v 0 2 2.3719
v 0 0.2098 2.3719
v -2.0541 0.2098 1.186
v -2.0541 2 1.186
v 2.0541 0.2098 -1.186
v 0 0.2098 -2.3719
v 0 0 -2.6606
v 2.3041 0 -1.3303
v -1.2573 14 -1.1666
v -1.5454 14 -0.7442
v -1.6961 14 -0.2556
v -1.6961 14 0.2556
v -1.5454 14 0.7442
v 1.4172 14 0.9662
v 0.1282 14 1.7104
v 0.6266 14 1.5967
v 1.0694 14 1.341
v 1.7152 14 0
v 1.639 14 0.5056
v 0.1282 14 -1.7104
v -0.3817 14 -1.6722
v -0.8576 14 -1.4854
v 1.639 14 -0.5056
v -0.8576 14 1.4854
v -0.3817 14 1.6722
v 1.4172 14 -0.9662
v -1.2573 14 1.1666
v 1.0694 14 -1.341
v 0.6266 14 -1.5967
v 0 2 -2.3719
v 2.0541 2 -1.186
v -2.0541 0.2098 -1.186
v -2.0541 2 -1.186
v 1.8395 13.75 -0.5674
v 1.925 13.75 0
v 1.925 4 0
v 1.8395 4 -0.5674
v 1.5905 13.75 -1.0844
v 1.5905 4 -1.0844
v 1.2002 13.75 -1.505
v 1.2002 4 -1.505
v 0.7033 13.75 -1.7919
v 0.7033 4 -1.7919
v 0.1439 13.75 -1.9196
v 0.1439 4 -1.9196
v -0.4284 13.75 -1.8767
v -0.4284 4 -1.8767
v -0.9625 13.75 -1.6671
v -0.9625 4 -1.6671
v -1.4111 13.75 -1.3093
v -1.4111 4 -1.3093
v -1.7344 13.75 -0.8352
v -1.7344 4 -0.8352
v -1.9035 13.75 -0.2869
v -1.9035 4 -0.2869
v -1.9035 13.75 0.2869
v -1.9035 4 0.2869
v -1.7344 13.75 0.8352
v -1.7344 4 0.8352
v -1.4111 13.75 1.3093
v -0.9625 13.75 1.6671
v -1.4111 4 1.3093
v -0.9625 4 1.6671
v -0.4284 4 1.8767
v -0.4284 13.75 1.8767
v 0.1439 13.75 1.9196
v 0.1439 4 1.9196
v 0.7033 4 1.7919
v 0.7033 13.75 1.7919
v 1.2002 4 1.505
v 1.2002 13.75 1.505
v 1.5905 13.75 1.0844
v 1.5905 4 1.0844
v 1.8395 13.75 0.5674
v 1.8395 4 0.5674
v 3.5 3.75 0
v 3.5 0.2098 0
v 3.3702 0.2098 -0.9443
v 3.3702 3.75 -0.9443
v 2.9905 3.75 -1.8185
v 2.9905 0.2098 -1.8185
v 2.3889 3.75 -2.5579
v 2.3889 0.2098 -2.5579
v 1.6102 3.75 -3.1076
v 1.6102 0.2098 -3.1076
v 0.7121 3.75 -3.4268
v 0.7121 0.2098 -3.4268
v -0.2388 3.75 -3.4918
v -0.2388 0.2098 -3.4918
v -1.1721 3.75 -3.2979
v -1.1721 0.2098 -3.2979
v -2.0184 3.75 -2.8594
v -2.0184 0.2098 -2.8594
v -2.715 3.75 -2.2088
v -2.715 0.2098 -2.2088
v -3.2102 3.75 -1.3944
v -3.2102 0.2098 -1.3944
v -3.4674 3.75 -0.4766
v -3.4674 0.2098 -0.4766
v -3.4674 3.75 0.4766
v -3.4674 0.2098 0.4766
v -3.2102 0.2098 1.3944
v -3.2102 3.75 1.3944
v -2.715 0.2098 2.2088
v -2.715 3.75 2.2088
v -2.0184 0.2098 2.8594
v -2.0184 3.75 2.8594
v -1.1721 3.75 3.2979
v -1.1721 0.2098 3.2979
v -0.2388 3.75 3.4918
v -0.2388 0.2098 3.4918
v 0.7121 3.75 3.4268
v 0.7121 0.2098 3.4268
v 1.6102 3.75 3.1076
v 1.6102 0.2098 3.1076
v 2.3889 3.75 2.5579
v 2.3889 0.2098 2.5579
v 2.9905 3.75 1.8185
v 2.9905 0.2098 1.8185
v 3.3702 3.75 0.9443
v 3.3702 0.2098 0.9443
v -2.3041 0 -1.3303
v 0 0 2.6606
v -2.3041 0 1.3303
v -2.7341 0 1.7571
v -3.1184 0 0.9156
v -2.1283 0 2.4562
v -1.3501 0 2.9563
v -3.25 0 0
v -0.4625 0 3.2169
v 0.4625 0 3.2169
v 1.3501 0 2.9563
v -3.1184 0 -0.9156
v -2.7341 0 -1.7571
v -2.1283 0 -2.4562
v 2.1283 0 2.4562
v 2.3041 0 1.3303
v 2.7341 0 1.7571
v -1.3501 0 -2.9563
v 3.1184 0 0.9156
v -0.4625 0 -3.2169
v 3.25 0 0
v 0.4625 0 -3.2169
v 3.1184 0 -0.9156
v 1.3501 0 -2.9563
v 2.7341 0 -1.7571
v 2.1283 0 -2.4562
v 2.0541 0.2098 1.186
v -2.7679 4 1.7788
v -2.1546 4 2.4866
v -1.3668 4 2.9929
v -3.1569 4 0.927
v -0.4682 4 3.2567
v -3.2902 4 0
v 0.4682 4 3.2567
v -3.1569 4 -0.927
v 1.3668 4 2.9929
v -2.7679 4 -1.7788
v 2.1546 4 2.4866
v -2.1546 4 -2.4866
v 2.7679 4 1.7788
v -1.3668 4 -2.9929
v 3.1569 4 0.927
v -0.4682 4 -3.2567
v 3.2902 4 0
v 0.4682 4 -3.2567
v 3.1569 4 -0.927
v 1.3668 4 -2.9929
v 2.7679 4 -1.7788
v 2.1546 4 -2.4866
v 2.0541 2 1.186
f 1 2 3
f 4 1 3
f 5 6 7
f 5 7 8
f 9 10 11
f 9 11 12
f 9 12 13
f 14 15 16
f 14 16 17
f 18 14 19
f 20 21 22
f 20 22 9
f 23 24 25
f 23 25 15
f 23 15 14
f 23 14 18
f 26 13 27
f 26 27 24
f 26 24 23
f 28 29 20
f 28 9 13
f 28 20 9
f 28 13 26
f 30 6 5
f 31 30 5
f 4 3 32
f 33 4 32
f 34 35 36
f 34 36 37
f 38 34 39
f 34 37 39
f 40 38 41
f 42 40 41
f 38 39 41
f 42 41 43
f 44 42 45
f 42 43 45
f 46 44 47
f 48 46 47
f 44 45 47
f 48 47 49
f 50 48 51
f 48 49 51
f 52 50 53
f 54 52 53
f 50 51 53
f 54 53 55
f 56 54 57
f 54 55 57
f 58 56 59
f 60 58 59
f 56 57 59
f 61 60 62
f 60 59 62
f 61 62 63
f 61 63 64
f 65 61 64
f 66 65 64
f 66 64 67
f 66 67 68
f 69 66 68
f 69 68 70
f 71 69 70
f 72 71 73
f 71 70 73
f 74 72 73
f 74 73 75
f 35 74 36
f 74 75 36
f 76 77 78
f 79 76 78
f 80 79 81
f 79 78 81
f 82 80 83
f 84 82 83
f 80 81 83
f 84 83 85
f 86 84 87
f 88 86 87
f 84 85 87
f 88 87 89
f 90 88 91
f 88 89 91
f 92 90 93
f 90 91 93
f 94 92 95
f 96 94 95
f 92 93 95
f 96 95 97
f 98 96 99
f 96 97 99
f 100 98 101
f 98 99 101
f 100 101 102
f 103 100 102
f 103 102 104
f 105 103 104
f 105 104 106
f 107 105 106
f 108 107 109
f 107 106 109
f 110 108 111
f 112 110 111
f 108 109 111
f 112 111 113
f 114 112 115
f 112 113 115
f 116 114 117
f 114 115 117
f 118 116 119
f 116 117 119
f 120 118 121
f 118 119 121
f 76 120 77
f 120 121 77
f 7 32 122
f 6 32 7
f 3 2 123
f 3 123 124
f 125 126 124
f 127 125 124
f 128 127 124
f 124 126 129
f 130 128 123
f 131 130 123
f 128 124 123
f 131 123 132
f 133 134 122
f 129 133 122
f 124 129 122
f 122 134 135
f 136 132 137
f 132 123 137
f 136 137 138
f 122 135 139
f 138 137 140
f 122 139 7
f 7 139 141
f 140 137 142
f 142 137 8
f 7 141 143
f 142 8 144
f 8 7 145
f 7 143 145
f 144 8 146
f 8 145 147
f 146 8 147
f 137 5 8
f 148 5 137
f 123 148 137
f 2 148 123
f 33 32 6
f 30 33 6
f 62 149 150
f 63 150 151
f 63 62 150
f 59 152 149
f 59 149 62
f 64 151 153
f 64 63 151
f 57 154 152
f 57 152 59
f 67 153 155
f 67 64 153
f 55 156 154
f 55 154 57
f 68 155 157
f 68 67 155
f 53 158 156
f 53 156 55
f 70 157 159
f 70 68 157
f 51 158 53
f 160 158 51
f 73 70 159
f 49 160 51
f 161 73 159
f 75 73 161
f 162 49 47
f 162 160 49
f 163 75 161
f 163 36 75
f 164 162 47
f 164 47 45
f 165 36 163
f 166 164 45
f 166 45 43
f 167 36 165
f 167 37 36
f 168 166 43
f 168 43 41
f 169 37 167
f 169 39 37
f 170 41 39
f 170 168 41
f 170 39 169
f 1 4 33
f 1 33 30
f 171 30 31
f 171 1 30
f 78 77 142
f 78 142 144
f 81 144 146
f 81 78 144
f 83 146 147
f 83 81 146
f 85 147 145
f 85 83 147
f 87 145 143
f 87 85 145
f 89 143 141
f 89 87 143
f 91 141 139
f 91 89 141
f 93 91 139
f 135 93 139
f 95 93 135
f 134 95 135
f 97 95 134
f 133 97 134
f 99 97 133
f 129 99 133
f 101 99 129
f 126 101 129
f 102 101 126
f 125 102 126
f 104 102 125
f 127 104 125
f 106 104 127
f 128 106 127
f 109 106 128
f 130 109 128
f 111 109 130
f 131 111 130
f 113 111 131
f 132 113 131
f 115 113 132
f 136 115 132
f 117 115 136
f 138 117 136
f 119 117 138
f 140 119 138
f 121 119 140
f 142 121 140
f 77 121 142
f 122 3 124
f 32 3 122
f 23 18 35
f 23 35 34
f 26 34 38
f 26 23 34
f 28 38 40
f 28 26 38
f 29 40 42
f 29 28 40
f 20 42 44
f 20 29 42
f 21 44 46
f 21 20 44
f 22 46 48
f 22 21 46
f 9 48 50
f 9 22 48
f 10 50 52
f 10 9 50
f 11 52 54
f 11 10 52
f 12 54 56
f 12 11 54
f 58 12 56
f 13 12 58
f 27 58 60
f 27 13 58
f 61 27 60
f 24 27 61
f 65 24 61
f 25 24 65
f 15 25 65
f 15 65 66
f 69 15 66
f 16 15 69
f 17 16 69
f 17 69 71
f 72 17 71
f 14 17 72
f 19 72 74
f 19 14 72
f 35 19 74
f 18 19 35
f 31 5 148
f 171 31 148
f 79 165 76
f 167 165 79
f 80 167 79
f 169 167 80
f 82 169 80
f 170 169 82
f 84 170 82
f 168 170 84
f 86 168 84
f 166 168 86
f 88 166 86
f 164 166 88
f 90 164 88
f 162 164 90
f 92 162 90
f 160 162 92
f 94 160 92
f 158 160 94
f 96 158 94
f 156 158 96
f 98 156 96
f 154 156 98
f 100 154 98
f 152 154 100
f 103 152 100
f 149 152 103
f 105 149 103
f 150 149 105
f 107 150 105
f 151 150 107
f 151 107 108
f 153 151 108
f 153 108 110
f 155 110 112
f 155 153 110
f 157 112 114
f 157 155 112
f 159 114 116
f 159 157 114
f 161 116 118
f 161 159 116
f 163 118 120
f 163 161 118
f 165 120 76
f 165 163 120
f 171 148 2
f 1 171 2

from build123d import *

# Parameters (mm, degrees)
SKETCH1_R             = 3.5
BOSS_EXTRUDE1_DEPTH   = 4
SKETCH2_R             = 1.925
BOSS_EXTRUDE2_DEPTH   = 10
CUT_EXTRUDE1_DEPTH    = 2
CHAMFER1_SIZE         = 0.25
CHAMFER1_SIZE2        = 0.209774908
CHAMFER1_PART_2_SIZE  = 0.25
CHAMFER1_PART_2_SIZE2 = 0.209774908
CHAMFER1_PART_3_SIZE  = 0.25
CHAMFER1_PART_3_SIZE2 = 0.209774908


with BuildPart() as part:
    # Sketch1 → Boss-Extrude1 (new body)
    with BuildSketch(Plane(origin=(0, 0, 0), x_dir=(1, 0, 0), z_dir=(0, 1, 0))):
        Circle(SKETCH1_R)
    extrude(amount=BOSS_EXTRUDE1_DEPTH)

    # Sketch2 → Boss-Extrude2 (add)
    with BuildSketch(Plane(origin=(0, 4, 0), x_dir=(1, 0, 0), z_dir=(0, 1, 0))):
        Circle(SKETCH2_R)
    extrude(amount=BOSS_EXTRUDE2_DEPTH)

    # Sketch3 → Cut-Extrude1 (cut)
    with BuildSketch(Plane.XZ):
        Polygon((0, 2.37190351), (-2.054128695, 1.185951755), (-2.054128695, -1.185951755), (0, -2.37190351), (2.054128695, -1.185951755), (2.054128695, 1.185951755), align=None)
    extrude(amount=-CUT_EXTRUDE1_DEPTH, mode=Mode.SUBTRACT)

    # Chamfer1
    chamfer1_edges = [part.edges().sort_by_distance(p)[0] for p in [
        (1.027064348, 0, 1.778927633),
        (-1.027064348, 0, 1.778927633),
        (-2.054128695, 0, 0),
        (-1.027064348, 0, -1.778927633),
        (1.027064348, 0, -1.778927633),
        (2.054128695, 0, 0),
        (-3.5, 0, 0),
    ]]
    chamfer1_side = [part.faces().sort_by_distance(p)[0] for p in [
        (-3.401005051, 0, 0),
    ]]
    chamfer(chamfer1_edges, length=CHAMFER1_SIZE, length2=CHAMFER1_SIZE2, reference=chamfer1_side[0])

    # Chamfer1 part 2
    chamfer1_part_2_edges = [part.edges().sort_by_distance(p)[0] for p in [
        (-3.5, 4, 0),
    ]]
    chamfer1_part_2_side = [part.faces().sort_by_distance(p)[0] for p in [
        (-3.5, 2, 0),
    ]]
    chamfer(chamfer1_part_2_edges, length=CHAMFER1_PART_2_SIZE, length2=CHAMFER1_PART_2_SIZE2, reference=chamfer1_part_2_side[0])

    # Chamfer1 part 3
    chamfer1_part_3_edges = [part.edges().sort_by_distance(p)[0] for p in [
        (-1.925, 14, 0),
    ]]
    chamfer1_part_3_side = [part.faces().sort_by_distance(p)[0] for p in [
        (-1.925, 9, 0),
    ]]
    chamfer(chamfer1_part_3_edges, length=CHAMFER1_PART_3_SIZE, length2=CHAMFER1_PART_3_SIZE2, reference=chamfer1_part_3_side[0])


solid = part.part
